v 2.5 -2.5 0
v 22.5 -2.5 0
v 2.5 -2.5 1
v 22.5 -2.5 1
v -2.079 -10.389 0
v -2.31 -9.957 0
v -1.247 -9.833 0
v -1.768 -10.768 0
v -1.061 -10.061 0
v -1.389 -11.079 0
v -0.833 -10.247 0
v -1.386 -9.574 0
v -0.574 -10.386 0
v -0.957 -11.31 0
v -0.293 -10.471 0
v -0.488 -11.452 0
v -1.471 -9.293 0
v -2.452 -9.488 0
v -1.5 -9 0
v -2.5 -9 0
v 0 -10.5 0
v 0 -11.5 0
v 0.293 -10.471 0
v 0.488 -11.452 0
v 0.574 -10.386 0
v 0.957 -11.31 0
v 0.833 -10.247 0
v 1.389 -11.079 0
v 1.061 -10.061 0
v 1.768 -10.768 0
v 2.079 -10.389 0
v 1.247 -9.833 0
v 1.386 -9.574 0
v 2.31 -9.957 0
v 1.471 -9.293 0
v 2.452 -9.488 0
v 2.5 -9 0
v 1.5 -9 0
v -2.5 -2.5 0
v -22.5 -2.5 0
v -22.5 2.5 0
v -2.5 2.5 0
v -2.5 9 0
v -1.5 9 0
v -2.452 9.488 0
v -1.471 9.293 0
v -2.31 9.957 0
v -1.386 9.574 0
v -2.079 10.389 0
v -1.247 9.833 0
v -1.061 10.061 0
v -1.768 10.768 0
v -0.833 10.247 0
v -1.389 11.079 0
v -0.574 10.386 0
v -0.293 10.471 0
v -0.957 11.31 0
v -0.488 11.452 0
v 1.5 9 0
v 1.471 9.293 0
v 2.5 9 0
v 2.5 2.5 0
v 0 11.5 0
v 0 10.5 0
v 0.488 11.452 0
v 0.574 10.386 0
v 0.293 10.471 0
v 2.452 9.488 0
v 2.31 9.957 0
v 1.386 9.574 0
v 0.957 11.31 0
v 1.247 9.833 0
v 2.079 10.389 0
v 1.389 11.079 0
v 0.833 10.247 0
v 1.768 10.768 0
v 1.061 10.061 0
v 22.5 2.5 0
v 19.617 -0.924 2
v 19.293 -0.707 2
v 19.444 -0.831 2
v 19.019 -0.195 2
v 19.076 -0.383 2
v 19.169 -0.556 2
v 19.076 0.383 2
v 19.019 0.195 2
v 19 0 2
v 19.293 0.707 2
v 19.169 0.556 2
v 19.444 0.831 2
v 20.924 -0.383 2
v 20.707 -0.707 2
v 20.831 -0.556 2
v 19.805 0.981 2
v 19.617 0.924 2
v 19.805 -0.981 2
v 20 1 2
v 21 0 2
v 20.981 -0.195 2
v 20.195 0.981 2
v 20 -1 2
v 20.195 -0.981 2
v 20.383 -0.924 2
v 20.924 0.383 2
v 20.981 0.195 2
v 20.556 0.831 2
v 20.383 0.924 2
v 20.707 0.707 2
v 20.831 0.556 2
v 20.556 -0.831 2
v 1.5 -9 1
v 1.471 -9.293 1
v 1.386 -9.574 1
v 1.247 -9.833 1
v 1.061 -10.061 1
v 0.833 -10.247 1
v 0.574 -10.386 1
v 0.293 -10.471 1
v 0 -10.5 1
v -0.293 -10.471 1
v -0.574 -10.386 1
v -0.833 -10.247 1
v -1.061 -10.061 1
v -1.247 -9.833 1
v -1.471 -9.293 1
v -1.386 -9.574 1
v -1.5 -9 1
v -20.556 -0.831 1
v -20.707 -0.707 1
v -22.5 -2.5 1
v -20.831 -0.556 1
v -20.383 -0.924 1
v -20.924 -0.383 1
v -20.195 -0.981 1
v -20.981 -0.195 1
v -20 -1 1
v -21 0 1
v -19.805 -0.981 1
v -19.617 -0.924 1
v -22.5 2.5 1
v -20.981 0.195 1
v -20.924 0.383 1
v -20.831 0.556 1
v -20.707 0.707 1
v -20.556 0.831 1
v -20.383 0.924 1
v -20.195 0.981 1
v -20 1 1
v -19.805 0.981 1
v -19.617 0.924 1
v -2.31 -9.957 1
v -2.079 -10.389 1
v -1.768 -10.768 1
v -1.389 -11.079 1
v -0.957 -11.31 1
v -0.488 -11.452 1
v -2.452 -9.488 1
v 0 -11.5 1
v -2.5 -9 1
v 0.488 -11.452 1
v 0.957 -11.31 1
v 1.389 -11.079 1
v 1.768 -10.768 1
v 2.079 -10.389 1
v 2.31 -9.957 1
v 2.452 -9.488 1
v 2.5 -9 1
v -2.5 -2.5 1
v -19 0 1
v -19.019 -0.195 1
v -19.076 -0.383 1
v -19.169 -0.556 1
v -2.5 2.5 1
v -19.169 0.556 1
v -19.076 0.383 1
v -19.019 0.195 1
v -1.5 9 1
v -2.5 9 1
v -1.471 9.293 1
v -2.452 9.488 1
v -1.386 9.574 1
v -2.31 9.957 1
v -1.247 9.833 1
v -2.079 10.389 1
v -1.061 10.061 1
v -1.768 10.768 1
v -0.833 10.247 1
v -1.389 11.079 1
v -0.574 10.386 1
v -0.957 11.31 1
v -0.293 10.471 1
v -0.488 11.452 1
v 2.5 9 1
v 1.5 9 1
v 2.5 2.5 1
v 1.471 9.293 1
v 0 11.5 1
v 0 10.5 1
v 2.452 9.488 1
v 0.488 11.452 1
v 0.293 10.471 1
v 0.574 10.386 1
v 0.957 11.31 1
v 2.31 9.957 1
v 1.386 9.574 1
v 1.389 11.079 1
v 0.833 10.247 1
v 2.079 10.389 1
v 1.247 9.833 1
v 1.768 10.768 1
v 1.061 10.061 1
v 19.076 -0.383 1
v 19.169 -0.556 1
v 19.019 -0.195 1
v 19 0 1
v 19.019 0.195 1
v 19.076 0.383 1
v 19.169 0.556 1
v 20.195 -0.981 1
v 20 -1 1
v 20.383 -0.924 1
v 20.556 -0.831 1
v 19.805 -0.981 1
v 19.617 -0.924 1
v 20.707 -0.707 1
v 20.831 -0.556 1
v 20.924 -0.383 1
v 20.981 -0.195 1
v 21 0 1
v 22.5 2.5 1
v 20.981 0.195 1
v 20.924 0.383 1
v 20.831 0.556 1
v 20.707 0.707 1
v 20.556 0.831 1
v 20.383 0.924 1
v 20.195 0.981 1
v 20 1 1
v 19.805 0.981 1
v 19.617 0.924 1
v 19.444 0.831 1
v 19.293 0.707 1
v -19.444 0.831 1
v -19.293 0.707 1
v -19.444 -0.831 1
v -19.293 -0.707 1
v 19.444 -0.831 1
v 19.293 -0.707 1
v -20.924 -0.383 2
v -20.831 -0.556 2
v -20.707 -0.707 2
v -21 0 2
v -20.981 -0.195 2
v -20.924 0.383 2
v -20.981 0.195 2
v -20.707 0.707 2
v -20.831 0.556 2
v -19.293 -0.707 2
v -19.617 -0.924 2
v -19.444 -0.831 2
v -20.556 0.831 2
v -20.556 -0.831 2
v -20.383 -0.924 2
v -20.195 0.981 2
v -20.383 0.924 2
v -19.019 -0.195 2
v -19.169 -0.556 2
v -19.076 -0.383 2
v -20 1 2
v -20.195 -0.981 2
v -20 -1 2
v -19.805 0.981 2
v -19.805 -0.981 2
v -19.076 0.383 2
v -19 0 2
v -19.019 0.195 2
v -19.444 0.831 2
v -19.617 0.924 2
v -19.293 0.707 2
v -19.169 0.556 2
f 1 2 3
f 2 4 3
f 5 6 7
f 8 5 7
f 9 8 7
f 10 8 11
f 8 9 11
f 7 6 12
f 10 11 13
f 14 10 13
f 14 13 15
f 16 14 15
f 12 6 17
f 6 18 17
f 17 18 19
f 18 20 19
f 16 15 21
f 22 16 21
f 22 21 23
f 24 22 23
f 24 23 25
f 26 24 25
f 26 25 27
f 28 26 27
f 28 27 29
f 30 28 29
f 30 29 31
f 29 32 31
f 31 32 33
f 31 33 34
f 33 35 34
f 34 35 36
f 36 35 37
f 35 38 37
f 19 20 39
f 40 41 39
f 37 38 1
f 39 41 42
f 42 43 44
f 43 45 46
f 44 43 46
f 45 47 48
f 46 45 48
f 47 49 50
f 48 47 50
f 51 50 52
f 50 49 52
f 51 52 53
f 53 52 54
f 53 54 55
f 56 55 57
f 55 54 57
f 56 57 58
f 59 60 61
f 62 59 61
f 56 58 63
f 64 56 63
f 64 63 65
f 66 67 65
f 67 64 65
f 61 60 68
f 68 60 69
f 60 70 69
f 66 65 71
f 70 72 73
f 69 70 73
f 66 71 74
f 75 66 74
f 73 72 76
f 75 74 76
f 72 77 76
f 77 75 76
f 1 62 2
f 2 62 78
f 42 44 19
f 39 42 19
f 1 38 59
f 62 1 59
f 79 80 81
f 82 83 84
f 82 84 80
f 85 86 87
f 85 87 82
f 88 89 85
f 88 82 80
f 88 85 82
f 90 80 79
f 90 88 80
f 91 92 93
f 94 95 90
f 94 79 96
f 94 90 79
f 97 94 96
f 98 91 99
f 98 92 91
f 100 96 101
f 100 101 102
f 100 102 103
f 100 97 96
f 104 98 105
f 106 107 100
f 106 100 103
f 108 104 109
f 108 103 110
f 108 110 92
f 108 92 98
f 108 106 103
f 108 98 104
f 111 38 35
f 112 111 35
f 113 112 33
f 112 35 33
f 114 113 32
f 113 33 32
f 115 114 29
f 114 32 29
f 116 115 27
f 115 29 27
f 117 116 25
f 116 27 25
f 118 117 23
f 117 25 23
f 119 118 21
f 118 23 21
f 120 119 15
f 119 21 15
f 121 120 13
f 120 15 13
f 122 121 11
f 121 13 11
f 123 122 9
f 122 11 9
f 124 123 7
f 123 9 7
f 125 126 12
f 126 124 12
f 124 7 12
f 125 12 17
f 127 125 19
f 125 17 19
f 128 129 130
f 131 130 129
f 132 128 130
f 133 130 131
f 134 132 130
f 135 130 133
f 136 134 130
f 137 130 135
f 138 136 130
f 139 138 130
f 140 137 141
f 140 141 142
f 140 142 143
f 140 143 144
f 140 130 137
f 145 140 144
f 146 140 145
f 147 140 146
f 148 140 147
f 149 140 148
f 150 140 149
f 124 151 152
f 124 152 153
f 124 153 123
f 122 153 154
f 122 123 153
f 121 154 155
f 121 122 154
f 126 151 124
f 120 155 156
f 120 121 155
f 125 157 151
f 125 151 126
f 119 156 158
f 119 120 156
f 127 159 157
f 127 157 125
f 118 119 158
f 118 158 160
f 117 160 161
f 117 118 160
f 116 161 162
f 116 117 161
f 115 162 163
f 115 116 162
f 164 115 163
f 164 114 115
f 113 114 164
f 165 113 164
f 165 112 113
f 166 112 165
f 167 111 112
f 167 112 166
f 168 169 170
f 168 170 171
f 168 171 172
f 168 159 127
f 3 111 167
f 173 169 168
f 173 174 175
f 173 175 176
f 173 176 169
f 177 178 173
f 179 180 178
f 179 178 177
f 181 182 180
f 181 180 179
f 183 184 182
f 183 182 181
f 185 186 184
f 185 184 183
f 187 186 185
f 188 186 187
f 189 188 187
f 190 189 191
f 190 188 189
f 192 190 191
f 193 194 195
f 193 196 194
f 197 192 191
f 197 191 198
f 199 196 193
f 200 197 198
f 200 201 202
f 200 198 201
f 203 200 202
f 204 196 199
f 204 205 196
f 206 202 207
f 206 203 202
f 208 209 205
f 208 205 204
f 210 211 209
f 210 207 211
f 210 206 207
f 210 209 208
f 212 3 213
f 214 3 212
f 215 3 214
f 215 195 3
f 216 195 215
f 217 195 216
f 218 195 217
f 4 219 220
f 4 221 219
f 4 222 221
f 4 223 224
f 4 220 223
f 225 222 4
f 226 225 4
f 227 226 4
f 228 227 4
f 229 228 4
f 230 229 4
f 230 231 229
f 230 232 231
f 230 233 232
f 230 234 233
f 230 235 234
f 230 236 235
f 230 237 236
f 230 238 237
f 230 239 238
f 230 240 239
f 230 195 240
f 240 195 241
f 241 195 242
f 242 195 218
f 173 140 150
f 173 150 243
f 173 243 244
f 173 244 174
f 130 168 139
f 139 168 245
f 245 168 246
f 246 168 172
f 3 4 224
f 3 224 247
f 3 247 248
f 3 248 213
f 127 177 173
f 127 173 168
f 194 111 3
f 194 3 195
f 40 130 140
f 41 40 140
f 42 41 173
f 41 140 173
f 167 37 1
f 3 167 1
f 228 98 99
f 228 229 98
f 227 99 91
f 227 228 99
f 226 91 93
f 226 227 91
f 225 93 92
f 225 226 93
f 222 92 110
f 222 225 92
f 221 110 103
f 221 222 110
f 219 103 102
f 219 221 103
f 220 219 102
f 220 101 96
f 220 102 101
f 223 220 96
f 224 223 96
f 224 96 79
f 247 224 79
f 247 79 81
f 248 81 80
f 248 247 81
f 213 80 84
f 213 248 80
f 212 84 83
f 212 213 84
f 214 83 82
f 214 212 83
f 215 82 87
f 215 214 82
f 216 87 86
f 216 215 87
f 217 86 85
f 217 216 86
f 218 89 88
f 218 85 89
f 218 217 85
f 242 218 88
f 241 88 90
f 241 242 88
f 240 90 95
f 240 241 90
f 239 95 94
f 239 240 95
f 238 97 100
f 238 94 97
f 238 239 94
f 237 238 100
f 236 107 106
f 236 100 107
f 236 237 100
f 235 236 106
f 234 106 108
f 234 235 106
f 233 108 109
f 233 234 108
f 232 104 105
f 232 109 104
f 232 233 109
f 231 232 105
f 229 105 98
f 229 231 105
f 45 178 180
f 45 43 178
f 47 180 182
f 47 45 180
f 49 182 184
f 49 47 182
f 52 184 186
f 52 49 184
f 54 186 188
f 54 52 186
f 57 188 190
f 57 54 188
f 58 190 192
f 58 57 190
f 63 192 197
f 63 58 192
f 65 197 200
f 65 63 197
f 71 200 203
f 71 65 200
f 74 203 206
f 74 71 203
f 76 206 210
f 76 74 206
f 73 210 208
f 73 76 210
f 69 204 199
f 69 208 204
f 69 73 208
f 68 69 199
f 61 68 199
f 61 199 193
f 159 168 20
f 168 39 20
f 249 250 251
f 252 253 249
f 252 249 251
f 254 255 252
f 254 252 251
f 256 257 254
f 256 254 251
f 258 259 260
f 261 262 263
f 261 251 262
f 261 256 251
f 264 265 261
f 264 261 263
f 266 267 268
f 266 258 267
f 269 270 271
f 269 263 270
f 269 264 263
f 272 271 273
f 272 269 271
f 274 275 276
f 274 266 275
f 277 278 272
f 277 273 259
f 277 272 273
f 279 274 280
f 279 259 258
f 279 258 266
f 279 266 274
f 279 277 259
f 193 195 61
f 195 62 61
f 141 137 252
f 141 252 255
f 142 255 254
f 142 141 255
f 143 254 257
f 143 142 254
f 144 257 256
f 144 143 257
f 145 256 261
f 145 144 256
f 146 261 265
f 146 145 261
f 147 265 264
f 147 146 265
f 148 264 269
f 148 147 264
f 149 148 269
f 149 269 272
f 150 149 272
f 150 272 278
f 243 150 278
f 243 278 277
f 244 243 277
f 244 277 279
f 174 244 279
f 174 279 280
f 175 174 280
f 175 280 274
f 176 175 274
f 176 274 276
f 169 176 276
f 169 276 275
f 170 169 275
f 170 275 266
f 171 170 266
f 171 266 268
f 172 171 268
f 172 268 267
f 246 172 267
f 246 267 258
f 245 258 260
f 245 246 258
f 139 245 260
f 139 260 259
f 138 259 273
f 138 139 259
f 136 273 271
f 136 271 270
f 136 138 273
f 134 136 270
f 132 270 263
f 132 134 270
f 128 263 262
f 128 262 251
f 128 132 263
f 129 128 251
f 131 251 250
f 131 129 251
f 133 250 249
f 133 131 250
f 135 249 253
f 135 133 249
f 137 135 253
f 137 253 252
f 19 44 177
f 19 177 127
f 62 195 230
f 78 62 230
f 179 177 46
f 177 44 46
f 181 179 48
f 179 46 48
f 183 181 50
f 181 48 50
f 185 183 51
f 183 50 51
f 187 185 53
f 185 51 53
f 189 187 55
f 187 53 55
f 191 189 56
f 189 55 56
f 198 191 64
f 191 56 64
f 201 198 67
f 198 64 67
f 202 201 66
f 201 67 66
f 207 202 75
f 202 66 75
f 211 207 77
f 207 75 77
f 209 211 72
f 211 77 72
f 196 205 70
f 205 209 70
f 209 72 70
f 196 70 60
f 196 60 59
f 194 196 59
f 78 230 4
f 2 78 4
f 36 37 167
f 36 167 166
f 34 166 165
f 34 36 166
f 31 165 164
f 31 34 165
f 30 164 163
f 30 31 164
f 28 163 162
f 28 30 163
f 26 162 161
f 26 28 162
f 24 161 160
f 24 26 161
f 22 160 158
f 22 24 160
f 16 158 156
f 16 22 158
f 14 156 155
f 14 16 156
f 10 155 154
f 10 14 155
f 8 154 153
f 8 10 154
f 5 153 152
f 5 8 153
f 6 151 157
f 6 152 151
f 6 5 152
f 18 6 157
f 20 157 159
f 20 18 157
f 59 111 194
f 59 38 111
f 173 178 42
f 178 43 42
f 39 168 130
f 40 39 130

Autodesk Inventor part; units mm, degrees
ref_plane "YZ Plane" through (0, 0, 0) normal (1, 0, 0) x (0, 1, 0)
ref_plane "XZ Plane" through (0, 0, 0) normal (0, 1, 0) x (-1, 0, 0)
ref_plane "XY Plane" through (0, 0, 0) normal (0, 0, 1) x (1, 0, 0)
sketch "스케치3" plane through (0, 0, 0) normal (0, 0, 1) x (1, 0, 0)
  line L0 (0, 9) -> (0, -9) construction
  line L1 (-1.5, 9) -> (-1.5, -9)
  line L2 (1.5, -9) -> (1.5, 9)
  arc A0 (1.5, 9) -> (-1.5, 9) centre (0, 9) ccw
  arc A1 (-1.5, -9) -> (1.5, -9) centre (0, -9) ccw
  line L3 (-2.5, 9) -> (-2.5, -9)
  arc A2 (-2.5, -9) -> (2.5, -9) centre (0, -9) ccw
  line L4 (2.5, -9) -> (2.5, 9)
  arc A3 (2.5, 9) -> (-2.5, 9) centre (0, 9) ccw
  line L5 (-3.5, 0) -> (3.5, 0) construction
  line L6 (0, -16.1) -> (0, 16.1) construction
  point P0 (0, 0)
  point P1 (0, 0)
  dimension "d8" = 18
  dimension "d9" = 1.5
  dimension "d10" = 1
  dimension "d11" = 9
extrude "돌출3" add sketch "스케치3" along normal blind 1
sketch "스케치4" plane through (0, 0, 1) normal (0, 0, 1) x (1, 0, 0)
  line L0 (2.5, -9) -> (2.5, 9) projected
  line L1 (2.5, 2.5) -> (22.5, 2.5)
  line L2 (22.5, 2.5) -> (22.5, -2.5)
  line L3 (22.5, -2.5) -> (2.5, -2.5)
  line L4 (2.5, -2.5) -> (2.5, 2.5)
  point P0 (0, 0)
  point P1 (2.5, -2.5)
  dimension "d14" = 20
  dimension "d15" = 2.5
  dimension "d16" = 5
extrude "돌출4" add sketch "스케치4" against normal blind 1
sketch "스케치5" plane through (0, 0, 1) normal (0, 0, 1) x (1, 0, 0)
  circle A0 centre (20, 0) radius 1
  line L0 (-7.5, 0) -> (27.5, 0) construction
  line L1 (0, -16.1) -> (0, 16.1) construction
  point P0 (0, 0)
  dimension "d19" = 2
  dimension "d20" = 20
extrude "돌출5" add sketch "스케치5" along normal blind 1
mirror "미러1" about plane through (0, 0, 0) normal (1, 0, 0) of "돌출4", "돌출5"
properties part number "축"
